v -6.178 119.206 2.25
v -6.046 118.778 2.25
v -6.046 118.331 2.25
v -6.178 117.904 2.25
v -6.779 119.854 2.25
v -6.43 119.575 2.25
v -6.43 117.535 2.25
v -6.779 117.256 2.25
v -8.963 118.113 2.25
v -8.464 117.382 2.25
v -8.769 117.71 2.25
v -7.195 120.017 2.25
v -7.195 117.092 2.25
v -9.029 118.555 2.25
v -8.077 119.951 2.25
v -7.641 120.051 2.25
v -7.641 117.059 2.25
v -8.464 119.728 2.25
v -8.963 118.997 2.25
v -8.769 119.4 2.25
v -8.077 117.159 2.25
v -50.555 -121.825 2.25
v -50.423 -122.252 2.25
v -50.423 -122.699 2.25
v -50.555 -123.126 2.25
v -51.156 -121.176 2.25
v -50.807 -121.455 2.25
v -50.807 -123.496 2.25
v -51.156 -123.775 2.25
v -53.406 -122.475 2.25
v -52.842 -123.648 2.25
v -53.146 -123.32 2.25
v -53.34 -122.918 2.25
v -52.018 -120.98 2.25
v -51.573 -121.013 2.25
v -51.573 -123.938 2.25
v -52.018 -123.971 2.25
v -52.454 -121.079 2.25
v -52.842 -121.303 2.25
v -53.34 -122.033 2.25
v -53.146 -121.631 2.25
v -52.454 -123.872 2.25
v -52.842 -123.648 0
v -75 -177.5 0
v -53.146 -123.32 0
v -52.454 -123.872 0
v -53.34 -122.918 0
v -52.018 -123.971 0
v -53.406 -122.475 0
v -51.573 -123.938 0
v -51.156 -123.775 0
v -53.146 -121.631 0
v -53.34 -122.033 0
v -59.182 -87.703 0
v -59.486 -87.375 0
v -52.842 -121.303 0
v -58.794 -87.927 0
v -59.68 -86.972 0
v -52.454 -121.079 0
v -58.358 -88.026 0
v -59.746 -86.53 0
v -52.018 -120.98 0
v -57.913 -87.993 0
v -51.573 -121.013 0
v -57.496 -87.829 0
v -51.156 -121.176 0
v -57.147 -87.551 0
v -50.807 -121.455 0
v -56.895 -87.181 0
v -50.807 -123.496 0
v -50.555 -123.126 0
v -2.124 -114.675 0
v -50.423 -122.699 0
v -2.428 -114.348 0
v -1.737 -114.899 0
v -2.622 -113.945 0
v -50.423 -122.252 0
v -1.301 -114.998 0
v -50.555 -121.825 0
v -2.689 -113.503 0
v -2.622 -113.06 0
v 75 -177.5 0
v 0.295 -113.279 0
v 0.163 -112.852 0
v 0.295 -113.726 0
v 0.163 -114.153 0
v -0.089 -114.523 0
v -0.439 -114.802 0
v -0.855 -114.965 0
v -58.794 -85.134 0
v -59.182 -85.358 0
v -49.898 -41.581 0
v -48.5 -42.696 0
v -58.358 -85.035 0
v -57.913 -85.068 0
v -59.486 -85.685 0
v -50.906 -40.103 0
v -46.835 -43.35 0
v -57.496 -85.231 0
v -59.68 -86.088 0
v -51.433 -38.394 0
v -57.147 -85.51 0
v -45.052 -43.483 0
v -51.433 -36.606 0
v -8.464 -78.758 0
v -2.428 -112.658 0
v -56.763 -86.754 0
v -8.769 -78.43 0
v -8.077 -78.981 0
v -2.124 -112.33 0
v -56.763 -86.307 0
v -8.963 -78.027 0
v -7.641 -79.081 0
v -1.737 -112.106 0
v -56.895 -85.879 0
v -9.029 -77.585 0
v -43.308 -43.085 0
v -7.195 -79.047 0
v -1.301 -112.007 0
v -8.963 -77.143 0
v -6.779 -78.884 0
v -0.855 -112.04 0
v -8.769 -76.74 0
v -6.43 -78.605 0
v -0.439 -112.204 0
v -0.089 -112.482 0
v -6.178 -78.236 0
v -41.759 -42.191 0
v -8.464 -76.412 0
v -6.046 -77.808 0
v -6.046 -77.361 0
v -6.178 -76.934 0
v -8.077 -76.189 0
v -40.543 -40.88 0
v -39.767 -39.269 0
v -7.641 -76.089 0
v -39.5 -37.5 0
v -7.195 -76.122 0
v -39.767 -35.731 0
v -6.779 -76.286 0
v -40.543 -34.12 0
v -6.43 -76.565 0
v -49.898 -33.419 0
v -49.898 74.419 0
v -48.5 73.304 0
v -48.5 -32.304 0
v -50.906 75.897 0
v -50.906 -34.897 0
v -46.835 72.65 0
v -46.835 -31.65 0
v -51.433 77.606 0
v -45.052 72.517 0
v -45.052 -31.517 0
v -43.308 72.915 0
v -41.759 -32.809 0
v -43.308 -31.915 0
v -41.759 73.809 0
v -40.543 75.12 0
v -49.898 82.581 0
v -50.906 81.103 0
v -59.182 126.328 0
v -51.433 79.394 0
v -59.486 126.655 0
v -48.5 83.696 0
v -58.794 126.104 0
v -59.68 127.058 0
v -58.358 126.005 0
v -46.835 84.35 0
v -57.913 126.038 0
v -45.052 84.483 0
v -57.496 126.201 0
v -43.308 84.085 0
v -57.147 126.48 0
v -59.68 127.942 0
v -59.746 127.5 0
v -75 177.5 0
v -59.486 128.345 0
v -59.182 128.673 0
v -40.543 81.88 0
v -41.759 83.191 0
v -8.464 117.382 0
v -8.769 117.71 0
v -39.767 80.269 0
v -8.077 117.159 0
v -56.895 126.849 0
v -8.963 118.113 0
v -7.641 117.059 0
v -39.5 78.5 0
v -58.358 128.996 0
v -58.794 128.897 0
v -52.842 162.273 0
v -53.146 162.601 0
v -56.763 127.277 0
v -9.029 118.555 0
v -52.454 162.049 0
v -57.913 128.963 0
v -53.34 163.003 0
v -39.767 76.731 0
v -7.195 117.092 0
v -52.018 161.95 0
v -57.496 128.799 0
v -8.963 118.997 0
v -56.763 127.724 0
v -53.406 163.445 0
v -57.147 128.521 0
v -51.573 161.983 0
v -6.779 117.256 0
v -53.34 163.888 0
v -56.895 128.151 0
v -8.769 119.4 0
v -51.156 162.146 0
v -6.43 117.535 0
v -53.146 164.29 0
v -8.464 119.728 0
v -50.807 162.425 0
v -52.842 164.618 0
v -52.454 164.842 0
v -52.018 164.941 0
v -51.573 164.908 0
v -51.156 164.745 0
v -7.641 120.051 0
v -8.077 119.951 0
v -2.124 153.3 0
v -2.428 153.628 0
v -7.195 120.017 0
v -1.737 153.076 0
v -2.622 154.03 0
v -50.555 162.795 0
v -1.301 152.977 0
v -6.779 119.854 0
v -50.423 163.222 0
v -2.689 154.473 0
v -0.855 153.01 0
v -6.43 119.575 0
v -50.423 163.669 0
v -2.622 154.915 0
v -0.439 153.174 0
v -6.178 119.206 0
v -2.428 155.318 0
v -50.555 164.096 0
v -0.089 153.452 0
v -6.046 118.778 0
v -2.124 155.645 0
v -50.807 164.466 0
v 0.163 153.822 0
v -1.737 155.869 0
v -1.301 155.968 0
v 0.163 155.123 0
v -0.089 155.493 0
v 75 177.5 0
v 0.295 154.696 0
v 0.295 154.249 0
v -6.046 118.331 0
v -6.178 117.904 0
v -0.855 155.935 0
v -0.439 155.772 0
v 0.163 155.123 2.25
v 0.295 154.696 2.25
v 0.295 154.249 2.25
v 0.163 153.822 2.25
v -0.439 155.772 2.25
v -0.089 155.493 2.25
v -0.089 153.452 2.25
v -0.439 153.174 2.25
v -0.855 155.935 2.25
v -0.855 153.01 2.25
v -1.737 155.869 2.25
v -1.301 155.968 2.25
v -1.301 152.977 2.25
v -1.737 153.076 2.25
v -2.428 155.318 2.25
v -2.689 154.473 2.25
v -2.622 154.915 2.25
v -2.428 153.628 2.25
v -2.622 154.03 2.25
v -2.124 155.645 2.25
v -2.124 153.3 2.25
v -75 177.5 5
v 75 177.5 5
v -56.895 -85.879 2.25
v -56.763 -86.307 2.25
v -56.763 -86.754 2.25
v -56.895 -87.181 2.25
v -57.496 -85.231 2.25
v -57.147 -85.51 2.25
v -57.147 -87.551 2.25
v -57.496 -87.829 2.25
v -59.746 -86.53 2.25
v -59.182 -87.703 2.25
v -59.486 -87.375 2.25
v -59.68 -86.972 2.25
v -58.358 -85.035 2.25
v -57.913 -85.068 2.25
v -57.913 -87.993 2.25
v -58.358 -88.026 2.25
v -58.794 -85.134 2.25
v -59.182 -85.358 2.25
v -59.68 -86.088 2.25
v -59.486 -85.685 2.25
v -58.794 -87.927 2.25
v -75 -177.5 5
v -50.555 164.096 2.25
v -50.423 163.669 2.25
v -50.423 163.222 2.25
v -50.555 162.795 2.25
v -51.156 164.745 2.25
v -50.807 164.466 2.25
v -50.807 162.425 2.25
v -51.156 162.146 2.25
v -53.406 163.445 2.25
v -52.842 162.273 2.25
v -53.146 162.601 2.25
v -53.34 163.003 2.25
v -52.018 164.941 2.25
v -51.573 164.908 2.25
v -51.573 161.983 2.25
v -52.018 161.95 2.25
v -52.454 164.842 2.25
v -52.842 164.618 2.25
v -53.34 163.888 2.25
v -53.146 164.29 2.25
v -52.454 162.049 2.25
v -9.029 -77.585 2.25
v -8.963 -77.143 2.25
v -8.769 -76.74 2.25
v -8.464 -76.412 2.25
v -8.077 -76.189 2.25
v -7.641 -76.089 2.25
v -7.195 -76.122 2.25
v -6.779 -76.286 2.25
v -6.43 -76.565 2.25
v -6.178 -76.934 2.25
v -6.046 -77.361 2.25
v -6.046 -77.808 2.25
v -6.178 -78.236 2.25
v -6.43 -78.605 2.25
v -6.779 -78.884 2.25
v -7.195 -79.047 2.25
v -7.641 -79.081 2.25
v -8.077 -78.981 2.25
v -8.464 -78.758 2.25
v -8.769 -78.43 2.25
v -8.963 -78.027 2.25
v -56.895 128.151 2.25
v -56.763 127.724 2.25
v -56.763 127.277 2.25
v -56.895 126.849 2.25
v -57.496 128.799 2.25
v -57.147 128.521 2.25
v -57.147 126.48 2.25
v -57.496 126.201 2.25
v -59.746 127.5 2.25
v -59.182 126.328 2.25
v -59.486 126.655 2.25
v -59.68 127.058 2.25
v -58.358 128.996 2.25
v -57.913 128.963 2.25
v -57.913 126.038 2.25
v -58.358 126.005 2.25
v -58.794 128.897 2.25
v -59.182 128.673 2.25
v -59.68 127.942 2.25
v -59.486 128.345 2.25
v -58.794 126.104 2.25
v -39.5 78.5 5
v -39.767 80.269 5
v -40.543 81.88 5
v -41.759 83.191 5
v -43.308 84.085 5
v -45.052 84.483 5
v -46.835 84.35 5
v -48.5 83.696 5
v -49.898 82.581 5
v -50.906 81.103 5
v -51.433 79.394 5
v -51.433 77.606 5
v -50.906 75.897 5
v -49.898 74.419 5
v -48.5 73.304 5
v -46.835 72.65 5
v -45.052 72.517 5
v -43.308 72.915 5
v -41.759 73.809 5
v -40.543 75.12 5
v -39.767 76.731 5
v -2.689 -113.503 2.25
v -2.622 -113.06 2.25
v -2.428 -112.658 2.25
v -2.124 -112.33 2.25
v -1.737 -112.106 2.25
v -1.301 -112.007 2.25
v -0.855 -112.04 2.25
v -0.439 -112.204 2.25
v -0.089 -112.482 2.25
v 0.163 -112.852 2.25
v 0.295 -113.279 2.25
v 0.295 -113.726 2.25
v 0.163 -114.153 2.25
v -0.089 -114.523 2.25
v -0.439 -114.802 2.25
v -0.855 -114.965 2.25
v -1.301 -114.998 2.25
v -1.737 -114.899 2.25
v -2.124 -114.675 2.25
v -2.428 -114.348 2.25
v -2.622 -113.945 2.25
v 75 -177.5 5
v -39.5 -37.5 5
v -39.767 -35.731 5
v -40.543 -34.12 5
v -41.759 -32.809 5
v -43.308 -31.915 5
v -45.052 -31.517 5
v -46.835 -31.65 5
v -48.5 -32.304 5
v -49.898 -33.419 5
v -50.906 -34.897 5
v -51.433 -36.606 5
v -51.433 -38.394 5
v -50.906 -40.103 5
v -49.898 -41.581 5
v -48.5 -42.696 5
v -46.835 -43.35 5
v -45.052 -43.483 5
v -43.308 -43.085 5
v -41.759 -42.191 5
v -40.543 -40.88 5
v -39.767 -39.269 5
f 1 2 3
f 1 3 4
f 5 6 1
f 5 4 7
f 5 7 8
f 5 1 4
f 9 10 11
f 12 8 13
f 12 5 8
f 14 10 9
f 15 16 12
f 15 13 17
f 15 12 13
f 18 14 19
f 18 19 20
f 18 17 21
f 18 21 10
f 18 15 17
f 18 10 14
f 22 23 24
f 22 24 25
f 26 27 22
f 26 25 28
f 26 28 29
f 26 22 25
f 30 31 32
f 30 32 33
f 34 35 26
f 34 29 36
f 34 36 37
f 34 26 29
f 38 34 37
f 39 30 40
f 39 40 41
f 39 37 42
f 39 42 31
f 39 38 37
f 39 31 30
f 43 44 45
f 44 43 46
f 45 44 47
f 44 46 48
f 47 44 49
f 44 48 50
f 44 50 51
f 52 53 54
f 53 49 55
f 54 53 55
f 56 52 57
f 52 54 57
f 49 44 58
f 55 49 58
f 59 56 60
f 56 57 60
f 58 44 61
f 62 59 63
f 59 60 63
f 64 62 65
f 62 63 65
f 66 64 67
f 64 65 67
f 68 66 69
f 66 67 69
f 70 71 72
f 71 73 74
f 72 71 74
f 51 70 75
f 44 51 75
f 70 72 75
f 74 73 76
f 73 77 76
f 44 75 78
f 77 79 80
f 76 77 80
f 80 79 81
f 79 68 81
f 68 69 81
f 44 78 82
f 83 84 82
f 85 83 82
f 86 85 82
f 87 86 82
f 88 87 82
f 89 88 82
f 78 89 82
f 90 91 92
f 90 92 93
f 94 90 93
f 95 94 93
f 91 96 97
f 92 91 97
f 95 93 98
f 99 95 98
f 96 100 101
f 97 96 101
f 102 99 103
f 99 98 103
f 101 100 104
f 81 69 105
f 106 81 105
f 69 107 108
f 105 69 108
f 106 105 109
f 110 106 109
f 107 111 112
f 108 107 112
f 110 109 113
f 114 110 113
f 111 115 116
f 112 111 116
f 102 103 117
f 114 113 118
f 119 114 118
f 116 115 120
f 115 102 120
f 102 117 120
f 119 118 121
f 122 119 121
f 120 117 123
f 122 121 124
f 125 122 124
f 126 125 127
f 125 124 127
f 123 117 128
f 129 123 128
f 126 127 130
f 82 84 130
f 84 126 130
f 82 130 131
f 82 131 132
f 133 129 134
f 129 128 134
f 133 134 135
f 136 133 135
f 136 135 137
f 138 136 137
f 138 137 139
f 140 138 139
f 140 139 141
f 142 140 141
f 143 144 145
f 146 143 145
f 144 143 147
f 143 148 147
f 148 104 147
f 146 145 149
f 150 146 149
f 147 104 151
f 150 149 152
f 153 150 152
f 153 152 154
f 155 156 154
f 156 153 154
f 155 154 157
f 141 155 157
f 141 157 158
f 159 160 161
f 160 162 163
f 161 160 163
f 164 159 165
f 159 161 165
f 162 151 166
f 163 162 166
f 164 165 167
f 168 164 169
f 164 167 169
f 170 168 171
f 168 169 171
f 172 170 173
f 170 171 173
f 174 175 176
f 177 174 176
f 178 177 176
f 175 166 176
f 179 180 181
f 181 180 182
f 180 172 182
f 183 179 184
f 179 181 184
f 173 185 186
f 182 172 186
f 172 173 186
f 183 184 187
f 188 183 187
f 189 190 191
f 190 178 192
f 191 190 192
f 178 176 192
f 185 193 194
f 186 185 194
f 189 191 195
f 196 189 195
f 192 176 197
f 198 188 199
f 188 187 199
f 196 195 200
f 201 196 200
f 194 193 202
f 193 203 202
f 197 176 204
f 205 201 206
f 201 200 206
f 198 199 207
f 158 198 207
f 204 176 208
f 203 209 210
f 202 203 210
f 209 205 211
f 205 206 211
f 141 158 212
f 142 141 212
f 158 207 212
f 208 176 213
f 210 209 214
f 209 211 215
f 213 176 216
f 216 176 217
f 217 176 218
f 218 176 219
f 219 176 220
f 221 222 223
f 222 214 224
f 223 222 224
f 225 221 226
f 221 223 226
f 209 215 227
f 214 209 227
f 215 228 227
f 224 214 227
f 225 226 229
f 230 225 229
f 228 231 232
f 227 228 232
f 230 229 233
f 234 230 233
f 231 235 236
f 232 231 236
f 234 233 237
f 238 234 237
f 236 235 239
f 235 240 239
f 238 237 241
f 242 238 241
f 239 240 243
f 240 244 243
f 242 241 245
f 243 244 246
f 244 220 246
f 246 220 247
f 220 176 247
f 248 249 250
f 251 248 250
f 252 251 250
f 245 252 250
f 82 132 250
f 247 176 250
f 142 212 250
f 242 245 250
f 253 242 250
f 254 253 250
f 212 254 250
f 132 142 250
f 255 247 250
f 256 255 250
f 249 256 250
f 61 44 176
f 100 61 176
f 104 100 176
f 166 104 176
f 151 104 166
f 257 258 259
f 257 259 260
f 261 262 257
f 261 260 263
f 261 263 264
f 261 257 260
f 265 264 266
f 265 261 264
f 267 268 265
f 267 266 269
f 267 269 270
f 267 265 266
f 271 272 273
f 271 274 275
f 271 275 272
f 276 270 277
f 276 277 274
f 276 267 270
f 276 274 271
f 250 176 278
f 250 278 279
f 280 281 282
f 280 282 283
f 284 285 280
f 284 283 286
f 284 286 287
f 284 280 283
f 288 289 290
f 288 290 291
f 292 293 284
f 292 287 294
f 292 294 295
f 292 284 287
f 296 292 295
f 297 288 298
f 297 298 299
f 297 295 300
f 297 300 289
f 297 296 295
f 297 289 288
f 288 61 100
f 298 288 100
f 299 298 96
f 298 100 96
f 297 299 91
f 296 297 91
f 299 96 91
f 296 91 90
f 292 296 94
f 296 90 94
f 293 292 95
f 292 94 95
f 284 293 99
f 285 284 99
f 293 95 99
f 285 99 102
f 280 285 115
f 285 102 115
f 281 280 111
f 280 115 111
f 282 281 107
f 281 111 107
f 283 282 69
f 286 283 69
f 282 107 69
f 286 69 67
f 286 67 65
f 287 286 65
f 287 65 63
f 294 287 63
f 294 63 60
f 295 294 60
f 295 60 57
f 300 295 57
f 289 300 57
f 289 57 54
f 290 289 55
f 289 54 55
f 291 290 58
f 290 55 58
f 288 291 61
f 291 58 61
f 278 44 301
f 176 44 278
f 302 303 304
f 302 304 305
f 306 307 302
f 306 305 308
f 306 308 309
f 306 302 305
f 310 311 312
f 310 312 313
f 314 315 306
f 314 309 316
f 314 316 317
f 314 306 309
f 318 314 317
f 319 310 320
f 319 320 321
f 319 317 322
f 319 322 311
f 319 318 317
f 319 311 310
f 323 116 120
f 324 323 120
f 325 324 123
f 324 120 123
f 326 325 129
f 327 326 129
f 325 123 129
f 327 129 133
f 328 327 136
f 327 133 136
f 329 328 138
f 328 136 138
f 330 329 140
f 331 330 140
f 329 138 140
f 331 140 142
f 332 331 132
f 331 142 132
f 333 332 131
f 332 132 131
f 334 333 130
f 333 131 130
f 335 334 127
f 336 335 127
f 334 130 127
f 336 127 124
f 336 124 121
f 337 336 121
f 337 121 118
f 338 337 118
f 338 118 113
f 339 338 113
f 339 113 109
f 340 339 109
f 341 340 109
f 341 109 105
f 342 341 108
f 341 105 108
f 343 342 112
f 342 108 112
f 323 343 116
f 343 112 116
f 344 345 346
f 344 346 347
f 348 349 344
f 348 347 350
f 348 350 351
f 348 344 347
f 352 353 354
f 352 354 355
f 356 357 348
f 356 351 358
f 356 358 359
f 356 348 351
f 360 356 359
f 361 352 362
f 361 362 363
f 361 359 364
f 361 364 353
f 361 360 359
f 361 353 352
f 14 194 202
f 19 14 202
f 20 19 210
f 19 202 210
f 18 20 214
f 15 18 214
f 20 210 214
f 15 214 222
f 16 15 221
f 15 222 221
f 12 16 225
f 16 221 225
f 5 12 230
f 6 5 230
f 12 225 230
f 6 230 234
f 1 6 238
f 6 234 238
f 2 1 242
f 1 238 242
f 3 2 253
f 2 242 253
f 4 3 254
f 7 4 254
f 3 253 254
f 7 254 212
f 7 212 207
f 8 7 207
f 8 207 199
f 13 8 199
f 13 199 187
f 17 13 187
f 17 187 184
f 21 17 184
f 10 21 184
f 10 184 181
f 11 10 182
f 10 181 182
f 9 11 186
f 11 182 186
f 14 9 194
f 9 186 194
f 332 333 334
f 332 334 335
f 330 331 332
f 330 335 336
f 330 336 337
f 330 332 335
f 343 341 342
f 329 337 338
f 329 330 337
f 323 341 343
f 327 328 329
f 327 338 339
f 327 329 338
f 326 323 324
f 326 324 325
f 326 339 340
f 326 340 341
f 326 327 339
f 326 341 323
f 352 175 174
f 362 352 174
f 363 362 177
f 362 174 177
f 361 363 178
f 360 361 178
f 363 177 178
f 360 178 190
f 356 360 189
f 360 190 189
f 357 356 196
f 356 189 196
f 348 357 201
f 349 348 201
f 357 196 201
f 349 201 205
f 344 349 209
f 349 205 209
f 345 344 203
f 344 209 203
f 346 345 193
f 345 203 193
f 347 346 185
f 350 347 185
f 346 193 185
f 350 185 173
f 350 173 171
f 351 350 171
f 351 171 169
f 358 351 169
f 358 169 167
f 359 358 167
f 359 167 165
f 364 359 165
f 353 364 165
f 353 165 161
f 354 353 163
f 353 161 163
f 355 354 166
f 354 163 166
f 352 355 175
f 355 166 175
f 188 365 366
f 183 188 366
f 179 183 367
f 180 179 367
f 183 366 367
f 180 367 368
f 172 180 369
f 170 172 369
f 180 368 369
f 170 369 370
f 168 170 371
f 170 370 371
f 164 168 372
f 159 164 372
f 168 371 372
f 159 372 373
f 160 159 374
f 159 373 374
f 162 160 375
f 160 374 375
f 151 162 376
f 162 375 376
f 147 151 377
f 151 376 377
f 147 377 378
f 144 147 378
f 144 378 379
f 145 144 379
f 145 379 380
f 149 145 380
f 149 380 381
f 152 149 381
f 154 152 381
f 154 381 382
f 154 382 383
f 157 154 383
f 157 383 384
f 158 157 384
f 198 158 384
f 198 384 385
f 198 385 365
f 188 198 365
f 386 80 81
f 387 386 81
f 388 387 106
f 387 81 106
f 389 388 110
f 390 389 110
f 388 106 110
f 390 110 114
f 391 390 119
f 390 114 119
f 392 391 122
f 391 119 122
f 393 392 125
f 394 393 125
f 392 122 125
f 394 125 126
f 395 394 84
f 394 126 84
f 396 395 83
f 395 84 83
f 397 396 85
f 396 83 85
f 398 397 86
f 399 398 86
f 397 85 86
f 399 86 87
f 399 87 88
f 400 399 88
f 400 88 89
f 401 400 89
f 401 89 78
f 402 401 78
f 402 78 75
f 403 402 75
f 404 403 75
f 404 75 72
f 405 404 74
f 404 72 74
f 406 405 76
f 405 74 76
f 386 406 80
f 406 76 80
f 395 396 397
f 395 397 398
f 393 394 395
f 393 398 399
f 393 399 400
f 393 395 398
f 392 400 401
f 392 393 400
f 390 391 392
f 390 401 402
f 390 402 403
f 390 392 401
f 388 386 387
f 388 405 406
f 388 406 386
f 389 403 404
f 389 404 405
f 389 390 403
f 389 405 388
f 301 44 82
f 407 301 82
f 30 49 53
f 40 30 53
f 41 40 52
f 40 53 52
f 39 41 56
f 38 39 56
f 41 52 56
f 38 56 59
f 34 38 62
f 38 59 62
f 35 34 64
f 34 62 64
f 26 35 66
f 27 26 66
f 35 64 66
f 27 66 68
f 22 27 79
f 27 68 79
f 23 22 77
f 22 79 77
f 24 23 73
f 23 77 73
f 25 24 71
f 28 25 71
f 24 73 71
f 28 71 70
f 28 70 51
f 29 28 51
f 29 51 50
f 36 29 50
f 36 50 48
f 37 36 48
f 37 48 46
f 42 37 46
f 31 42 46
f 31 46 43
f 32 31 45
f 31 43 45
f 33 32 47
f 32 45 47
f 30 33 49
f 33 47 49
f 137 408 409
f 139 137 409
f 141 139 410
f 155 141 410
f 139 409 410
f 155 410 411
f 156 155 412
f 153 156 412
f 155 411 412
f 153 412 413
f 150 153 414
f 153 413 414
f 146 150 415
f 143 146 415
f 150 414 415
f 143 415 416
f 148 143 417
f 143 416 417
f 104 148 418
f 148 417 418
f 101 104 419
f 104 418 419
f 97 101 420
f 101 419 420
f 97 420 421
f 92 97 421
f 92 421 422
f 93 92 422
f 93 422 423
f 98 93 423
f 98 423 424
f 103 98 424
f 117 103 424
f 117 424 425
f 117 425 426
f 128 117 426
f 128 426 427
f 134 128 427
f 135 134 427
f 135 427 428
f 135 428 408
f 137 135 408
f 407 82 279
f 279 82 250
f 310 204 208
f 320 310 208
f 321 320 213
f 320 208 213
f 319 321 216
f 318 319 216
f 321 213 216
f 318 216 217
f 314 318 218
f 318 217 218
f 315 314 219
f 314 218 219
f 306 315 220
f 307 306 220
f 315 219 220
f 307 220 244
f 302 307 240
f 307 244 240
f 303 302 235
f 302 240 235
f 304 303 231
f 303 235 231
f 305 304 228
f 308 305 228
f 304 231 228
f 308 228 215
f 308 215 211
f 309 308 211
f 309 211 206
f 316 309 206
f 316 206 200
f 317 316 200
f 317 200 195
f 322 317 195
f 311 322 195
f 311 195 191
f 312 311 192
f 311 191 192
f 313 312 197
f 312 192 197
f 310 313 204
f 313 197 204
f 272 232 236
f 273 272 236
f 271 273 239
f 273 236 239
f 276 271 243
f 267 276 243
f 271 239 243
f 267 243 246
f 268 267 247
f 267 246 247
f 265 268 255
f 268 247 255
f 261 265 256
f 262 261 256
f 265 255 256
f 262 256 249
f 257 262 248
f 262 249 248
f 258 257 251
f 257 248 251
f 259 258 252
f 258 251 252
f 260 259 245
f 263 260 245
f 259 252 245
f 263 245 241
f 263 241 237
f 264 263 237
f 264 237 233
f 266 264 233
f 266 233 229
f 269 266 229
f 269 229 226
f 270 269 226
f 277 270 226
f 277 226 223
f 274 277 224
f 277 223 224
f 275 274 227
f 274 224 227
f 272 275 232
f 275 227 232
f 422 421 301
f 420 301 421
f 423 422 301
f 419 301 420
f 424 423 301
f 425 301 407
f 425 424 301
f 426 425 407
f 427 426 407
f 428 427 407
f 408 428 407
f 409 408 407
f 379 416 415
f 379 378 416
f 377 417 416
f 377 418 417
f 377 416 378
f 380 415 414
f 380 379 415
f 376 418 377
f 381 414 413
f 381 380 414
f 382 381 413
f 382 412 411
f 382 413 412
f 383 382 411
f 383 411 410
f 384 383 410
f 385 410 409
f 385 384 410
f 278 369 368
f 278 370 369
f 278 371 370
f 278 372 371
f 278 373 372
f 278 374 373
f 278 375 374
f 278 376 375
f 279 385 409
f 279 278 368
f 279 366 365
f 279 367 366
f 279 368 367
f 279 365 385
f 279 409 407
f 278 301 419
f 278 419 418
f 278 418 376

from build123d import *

# Parameters (mm, degrees)
ESQUISSE1_W             = 150
ESQUISSE1_H             = 355
BOSS_EXTRU_1_DEPTH      = 5
ESQUISSE2_R             = 6
ENL_V_MAT_EXTRU_1_DEPTH = 20
ESQUISSE3_R             = 1.5
ENL_V_MAT_EXTRU_2_DEPTH = 2.25


with BuildPart() as part:
    # Esquisse1 → Boss.-Extru.1 (new body)
    with BuildSketch(Plane.XY):
        Rectangle(ESQUISSE1_W, ESQUISSE1_H)
    extrude(amount=BOSS_EXTRU_1_DEPTH)

    # Esquisse2 → Enlèv. mat.-Extru.1 (cut)
    with BuildSketch(Plane.XY.offset(5)):
        with Locations((-45.5, 78.5)):
            Circle(ESQUISSE2_R)
        with Locations((-45.5, -37.5)):
            Circle(ESQUISSE2_R)
    extrude(amount=-ENL_V_MAT_EXTRU_1_DEPTH, mode=Mode.SUBTRACT)

    # Esquisse3 → Enlèv. mat.-Extru.2 (cut)
    with BuildSketch(Plane(origin=(0, 0, 0), x_dir=(-1, 0, 0), z_dir=(0, 0, -1))):
        with Locations((1.188690161, 154.472601824)):
            Circle(ESQUISSE3_R)
        with Locations((51.906289441, 163.445482985)):
            Circle(ESQUISSE3_R)
        with Locations((7.529151507, 118.554842214)):
            Circle(ESQUISSE3_R)
        with Locations((58.246291945, 127.500325199)):
            Circle(ESQUISSE3_R)
        with Locations((7.529151507, -77.584842214)):
            Circle(ESQUISSE3_R)
        with Locations((58.246291945, -86.530325199)):
            Circle(ESQUISSE3_R)
        with Locations((1.188690161, -113.502601824)):
            Circle(ESQUISSE3_R)
        with Locations((51.906289441, -122.475482985)):
            Circle(ESQUISSE3_R)
    extrude(amount=-ENL_V_MAT_EXTRU_2_DEPTH, mode=Mode.SUBTRACT)


solid = part.part
